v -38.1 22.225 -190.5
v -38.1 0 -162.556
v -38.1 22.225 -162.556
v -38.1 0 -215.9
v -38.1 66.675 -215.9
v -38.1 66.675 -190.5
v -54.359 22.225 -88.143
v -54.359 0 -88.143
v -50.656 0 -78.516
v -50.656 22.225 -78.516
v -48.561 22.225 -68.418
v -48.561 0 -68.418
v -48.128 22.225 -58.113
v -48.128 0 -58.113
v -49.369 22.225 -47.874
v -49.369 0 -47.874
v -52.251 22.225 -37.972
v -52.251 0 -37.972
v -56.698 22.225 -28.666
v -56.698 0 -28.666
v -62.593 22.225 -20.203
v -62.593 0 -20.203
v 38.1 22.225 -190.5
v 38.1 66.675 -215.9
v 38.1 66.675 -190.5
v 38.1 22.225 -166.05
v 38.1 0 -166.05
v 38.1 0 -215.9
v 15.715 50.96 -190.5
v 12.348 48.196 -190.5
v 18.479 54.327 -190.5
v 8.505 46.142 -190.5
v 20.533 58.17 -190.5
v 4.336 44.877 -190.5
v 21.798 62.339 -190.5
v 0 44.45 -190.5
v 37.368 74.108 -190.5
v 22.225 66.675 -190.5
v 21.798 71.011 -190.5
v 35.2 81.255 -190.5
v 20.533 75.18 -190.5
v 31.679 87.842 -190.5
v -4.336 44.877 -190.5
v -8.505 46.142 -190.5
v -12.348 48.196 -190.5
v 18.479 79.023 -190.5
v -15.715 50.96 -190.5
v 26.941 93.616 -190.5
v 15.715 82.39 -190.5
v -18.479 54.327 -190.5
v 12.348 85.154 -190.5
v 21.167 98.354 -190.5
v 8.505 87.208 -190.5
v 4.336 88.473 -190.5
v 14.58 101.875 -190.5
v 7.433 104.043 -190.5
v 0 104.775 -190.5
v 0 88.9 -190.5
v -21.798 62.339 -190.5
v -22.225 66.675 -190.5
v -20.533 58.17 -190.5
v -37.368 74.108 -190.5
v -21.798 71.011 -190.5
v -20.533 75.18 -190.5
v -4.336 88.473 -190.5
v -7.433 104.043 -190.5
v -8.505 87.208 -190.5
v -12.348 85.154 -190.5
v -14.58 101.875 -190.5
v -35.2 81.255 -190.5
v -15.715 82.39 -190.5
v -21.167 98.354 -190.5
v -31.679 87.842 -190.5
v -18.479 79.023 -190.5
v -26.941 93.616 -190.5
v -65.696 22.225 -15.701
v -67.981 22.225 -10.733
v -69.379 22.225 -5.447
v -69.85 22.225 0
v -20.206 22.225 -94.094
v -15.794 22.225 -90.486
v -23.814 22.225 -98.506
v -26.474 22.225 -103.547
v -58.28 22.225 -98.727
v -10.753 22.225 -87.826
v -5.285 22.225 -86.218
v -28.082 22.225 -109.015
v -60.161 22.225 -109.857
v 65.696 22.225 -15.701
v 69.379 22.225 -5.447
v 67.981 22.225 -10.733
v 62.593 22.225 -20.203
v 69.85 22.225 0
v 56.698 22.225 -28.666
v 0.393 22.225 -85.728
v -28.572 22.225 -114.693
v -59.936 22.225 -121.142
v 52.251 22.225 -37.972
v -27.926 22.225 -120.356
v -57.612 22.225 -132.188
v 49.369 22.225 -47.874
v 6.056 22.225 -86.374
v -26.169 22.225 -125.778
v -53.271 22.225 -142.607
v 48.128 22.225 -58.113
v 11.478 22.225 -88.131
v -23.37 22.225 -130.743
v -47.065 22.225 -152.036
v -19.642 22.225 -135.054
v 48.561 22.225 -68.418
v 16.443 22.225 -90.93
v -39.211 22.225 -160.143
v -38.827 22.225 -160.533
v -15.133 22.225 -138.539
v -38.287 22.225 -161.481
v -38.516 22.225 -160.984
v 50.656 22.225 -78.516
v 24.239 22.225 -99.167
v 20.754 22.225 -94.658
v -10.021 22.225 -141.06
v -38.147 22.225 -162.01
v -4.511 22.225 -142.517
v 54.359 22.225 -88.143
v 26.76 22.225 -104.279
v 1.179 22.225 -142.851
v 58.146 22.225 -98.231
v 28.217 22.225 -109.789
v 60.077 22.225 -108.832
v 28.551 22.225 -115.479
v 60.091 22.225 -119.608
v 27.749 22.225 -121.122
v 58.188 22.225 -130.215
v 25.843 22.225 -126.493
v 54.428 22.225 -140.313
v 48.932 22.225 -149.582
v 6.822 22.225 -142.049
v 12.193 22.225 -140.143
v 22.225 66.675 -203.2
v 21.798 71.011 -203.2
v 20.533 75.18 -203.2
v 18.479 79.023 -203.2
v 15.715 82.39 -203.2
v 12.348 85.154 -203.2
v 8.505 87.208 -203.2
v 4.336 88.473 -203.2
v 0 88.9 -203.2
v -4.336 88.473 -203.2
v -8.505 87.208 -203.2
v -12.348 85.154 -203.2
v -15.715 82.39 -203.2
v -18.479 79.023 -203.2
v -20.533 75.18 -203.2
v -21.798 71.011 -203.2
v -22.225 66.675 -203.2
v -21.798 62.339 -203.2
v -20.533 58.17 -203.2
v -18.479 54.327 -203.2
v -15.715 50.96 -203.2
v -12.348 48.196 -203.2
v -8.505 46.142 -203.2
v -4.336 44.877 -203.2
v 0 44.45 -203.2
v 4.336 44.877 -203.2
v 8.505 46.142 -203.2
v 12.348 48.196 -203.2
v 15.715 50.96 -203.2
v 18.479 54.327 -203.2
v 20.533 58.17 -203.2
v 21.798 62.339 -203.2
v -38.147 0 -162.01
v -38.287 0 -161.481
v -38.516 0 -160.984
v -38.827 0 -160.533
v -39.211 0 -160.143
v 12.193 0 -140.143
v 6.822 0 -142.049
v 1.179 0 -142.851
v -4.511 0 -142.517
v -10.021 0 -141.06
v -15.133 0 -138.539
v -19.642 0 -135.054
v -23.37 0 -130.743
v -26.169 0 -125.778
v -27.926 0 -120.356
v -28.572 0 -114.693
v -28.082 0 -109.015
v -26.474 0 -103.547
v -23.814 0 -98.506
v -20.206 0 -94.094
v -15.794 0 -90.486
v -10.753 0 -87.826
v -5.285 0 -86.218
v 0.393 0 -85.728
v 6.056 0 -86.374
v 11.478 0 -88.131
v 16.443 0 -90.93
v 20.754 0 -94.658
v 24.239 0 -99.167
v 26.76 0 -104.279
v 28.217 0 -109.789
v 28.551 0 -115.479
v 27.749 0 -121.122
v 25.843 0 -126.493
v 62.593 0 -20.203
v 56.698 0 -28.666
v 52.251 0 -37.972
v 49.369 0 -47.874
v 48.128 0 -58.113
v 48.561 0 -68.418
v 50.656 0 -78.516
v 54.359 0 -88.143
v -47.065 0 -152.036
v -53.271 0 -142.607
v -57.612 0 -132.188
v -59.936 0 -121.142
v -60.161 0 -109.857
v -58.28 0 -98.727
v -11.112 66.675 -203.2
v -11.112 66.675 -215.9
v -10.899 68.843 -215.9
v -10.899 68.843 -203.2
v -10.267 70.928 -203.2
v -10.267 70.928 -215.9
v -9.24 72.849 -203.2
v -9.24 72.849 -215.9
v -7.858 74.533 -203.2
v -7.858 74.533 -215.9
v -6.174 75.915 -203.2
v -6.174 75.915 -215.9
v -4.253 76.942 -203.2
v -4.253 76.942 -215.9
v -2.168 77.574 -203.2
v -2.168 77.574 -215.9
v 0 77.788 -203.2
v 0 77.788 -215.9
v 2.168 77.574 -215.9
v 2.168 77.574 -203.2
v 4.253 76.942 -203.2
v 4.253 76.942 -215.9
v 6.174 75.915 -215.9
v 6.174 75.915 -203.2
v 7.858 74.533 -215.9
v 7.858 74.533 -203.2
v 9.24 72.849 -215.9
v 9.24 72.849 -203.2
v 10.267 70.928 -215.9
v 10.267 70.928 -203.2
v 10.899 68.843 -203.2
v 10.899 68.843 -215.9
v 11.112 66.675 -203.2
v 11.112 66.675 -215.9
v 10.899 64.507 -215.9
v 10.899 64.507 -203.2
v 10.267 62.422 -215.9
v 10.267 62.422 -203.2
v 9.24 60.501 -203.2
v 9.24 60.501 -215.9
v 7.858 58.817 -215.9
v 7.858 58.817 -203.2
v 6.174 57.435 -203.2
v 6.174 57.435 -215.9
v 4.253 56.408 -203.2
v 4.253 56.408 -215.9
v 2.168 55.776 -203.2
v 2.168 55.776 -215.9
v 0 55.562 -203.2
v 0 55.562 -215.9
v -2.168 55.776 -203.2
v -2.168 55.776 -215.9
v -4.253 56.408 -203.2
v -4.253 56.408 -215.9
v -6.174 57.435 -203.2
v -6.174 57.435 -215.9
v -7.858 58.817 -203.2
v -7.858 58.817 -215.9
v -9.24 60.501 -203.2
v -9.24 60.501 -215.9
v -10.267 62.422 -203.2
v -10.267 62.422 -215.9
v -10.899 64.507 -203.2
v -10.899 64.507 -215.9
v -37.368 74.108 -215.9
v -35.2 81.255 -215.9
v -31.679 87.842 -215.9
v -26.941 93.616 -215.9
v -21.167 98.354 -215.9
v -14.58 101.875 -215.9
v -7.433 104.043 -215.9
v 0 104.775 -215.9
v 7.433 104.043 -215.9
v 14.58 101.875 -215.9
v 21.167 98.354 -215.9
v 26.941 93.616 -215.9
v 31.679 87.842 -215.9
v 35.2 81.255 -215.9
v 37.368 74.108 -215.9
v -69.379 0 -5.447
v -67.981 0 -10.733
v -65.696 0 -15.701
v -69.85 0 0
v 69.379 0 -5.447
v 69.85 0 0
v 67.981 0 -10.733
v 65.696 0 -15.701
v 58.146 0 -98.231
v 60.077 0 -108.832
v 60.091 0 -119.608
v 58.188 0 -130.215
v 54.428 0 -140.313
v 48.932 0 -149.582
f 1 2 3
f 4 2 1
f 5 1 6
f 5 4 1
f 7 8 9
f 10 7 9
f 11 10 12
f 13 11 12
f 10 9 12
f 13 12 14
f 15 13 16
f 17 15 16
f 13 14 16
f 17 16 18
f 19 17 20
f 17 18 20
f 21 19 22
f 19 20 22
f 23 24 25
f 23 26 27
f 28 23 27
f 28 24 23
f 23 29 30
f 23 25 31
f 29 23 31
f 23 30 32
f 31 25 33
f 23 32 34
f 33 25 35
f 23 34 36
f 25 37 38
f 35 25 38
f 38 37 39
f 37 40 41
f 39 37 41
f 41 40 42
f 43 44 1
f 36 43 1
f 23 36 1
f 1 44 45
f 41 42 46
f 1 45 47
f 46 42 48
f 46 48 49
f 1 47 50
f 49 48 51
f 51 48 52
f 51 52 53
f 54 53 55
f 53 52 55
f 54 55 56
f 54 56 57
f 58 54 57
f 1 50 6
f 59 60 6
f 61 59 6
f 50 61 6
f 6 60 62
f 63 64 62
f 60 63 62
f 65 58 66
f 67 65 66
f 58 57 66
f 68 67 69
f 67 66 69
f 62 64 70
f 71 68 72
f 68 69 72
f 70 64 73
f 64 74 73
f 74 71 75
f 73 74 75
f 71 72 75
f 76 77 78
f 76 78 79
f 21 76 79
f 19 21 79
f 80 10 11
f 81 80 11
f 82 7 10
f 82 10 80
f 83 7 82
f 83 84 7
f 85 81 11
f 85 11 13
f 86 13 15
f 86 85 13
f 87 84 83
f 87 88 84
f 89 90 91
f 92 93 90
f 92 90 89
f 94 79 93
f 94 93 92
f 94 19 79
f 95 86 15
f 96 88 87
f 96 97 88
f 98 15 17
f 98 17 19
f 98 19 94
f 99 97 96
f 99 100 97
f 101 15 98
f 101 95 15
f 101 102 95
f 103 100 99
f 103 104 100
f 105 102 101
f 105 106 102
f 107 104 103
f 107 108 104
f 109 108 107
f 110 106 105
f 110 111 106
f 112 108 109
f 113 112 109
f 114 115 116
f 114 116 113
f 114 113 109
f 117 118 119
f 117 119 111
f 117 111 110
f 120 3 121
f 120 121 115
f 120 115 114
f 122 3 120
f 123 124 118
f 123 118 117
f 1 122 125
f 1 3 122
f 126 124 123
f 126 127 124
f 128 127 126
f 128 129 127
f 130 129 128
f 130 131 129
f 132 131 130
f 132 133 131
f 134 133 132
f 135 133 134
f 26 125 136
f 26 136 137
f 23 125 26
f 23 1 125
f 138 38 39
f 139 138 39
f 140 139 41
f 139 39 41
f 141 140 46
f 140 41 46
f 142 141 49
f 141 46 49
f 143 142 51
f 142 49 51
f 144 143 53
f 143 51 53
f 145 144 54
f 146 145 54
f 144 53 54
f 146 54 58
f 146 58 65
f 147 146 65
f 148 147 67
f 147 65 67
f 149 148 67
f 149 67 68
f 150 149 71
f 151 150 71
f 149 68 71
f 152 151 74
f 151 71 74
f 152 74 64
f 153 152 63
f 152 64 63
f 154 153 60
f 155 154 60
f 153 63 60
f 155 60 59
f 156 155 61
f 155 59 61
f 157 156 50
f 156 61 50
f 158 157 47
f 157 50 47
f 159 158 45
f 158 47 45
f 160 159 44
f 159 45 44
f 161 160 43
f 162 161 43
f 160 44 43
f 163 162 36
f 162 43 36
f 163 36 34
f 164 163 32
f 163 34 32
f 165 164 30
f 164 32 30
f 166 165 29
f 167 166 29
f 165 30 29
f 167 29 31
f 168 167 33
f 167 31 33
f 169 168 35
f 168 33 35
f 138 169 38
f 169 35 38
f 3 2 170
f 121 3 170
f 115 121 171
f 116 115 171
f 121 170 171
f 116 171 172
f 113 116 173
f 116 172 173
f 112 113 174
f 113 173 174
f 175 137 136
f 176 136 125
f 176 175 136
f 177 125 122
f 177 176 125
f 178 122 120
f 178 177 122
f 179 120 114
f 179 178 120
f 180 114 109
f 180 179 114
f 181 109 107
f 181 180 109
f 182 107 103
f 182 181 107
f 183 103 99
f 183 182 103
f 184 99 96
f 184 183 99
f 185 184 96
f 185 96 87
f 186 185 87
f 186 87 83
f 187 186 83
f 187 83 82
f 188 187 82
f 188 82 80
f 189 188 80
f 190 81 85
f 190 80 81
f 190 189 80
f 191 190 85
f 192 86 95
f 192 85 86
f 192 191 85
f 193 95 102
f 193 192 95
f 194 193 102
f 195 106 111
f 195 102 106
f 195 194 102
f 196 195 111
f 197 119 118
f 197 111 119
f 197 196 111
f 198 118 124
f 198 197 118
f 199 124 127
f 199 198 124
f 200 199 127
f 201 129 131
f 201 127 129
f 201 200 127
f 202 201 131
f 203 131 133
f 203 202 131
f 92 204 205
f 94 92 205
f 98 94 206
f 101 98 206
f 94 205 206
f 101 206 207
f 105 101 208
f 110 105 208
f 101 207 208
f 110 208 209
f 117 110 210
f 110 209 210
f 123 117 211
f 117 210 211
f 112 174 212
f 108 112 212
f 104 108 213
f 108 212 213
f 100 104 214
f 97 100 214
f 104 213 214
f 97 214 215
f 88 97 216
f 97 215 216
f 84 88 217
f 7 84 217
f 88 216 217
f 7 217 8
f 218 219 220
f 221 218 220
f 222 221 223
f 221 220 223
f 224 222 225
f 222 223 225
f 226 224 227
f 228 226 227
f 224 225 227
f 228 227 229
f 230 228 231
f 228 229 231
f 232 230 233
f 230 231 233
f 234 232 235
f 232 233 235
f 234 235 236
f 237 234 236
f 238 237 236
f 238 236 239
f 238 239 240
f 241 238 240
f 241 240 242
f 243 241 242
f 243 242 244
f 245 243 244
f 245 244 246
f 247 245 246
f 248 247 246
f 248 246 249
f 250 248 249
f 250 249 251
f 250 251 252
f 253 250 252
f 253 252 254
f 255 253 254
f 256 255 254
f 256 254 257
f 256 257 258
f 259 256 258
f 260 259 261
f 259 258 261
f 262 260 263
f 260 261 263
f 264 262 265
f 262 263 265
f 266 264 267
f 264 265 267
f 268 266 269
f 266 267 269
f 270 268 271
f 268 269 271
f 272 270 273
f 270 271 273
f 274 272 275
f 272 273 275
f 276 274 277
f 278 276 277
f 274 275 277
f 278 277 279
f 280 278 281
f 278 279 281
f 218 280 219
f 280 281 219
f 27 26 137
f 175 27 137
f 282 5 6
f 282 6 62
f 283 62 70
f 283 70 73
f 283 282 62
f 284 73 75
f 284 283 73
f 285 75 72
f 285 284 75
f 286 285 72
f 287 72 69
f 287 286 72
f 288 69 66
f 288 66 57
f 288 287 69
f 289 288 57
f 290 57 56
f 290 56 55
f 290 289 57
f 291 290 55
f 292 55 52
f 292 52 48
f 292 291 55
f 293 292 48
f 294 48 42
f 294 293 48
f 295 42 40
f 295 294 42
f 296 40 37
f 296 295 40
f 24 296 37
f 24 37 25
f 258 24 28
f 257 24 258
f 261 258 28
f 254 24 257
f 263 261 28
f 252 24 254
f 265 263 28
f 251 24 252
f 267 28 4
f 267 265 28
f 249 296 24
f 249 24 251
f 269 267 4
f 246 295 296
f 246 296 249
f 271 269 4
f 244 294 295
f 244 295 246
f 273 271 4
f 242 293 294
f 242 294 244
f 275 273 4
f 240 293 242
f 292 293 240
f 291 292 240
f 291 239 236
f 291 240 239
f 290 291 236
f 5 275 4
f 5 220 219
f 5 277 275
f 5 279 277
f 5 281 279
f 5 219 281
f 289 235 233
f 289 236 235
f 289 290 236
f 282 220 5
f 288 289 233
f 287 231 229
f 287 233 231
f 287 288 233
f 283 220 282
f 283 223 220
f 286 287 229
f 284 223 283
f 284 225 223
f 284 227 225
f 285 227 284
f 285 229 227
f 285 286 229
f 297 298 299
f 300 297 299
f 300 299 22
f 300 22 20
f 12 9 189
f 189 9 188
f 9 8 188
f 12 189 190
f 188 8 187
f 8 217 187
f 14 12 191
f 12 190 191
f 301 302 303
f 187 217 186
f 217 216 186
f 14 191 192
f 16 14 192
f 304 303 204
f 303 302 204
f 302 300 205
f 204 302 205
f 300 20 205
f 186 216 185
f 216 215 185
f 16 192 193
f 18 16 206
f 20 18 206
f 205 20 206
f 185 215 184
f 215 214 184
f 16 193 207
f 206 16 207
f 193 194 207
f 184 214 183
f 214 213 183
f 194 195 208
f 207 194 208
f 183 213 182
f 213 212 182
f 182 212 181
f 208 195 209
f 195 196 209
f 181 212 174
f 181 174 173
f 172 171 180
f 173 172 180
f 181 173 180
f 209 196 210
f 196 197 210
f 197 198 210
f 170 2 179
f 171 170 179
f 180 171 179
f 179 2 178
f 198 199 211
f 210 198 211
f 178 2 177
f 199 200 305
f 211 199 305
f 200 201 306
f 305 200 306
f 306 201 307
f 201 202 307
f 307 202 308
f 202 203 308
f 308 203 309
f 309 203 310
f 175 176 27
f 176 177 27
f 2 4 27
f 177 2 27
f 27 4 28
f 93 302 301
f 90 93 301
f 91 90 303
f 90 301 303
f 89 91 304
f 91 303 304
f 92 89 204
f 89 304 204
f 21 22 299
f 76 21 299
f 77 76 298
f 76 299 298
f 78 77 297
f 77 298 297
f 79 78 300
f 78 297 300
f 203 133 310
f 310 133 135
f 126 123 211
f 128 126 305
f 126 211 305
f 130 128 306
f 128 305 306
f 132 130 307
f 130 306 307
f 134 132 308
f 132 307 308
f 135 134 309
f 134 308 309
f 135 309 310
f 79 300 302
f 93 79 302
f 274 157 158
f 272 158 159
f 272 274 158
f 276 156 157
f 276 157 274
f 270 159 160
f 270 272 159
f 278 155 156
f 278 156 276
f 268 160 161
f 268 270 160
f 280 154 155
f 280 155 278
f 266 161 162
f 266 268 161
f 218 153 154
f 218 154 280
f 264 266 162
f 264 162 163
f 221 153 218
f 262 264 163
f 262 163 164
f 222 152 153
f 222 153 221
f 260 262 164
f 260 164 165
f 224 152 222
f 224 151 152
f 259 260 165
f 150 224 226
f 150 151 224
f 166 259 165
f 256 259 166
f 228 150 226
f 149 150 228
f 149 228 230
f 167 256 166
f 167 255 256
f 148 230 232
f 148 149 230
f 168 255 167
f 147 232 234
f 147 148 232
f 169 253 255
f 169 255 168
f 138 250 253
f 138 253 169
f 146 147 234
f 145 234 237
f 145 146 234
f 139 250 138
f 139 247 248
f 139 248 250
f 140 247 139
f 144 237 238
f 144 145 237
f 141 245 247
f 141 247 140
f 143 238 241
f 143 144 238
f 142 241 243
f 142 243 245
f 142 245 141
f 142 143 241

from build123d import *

# Parameters (mm, degrees)
SKETCH1_R           = 28.575
BOSS_EXTRUDE1_DEPTH = 22.225
SKETCH3_R           = 11.1125
BOSS_EXTRUDE2_DEPTH = 25.4
SKETCH4_R           = 22.225
CUT_EXTRUDE1_DEPTH  = 12.7
CUT_EXTRUDE2_DEPTH  = 23.225


with BuildPart() as part:
    # Sketch1 → Boss-Extrude1 (new body)
    with BuildSketch(Plane(origin=(0, 0, 0), x_dir=(1, 0, 0), z_dir=(0, 1, 0))):
        with BuildLine():
            Line((-69.85, 0), (69.85, 0))
            ThreePointArc((69.85, 0), (67.980720293, 10.733361765), (62.592988676, 20.202871225))
            ThreePointArc((62.592988676, 20.202871225), (48.540246687, 52.968596396), (54.358983449, 88.142657944))
            ThreePointArc((54.358983449, 88.142657944), (59.032707712, 126.719542875), (39.21125, 160.143031078))
            ThreePointArc((39.21125, 160.143031078), (38.391163038, 161.227624395), (38.1, 162.555822188))
            Line((38.1, 162.555822188), (38.1, 215.9))
            Line((38.1, 215.9), (-38.1, 215.9))
            Line((-38.1, 215.9), (-38.1, 162.555822188))
            ThreePointArc((-38.1, 162.555822188), (-38.391163038, 161.227624395), (-39.21125, 160.143031078))
            ThreePointArc((-39.21125, 160.143031078), (-59.032707712, 126.719542875), (-54.358983449, 88.142657944))
            ThreePointArc((-54.358983449, 88.142657944), (-48.540246687, 52.968596396), (-62.592988676, 20.202871225))
            ThreePointArc((-62.592988676, 20.202871225), (-67.980720293, 10.733361765), (-69.85, 0))
        make_face()
        with Locations((0, 114.3)):
            Circle(SKETCH1_R, mode=Mode.SUBTRACT)
    extrude(amount=BOSS_EXTRUDE1_DEPTH)

    # Sketch3 → Boss-Extrude2 (add)
    with BuildSketch(Plane(origin=(0, 0, -215.9), x_dir=(-1, 0, 0), z_dir=(0, 0, -1))):
        with BuildLine():
            Line((-38.1, 22.225), (38.1, 22.225))
            Line((38.1, 22.225), (38.1, 66.675))
            ThreePointArc((38.1, 66.675), (0, 104.775), (-38.1, 66.675))
            Line((-38.1, 66.675), (-38.1, 22.225))
        make_face()
        with Locations((0, 66.675)):
            Circle(SKETCH3_R, mode=Mode.SUBTRACT)
    extrude(amount=-BOSS_EXTRUDE2_DEPTH)

    # Sketch4 → Cut-Extrude1 (cut)
    with BuildSketch(Plane.XY.offset(-190.5)):
        with Locations((0, 66.675)):
            Circle(SKETCH4_R)
    extrude(amount=-CUT_EXTRUDE1_DEPTH, mode=Mode.SUBTRACT)

    # Sketch5 → Cut-Extrude2 (cut, through all)
    with BuildSketch(Plane(origin=(0, 22.225, 0), x_dir=(1, 0, 0), z_dir=(0, 1, 0))):
        with BuildLine():
            ThreePointArc((39.21125, 160.143031078), (40.964734437, 158.583136265), (42.656216575, 156.956216575))
            Line((42.656216575, 156.956216575), (51.593275336, 165.893275336))
            Line((51.593275336, 165.893275336), (44.768280684, 172.718269988))
            Line((44.768280684, 172.718269988), (38.1, 166.049989304))
            Line((38.1, 166.049989304), (38.1, 162.555822188))
            ThreePointArc((38.1, 162.555822188), (38.391163038, 161.227624395), (39.21125, 160.143031078))
        make_face()
        with BuildLine():
            ThreePointArc((12.193016824, 140.143006128), (16.442699368, 137.670243099), (20.205576272, 134.505576272))
            Line((20.205576272, 134.505576272), (42.656216575, 156.956216575))
            ThreePointArc((42.656216575, 156.956216575), (40.964734437, 158.583136265), (39.21125, 160.143031078))
            ThreePointArc((39.21125, 160.143031078), (38.391163038, 161.227624395), (38.1, 162.555822188))
            Line((38.1, 162.555822188), (38.1, 166.049989304))
            Line((38.1, 166.049989304), (12.193016824, 140.143006128))
        make_face()
        with BuildLine():
            Line((51.593275336, 165.893275336), (42.656216575, 156.956216575))
            ThreePointArc((42.656216575, 156.956216575), (45.942151261, 153.395068263), (48.931671801, 149.581682497))
            Line((48.931671801, 149.581682497), (58.418269988, 159.068280684))
            Line((58.418269988, 159.068280684), (51.593275336, 165.893275336))
        make_face()
        with BuildLine():
            Line((42.656216575, 156.956216575), (20.205576272, 134.505576272))
            ThreePointArc((20.205576272, 134.505576272), (23.370243099, 130.742699368), (25.843006128, 126.493016824))
            Line((25.843006128, 126.493016824), (48.931671801, 149.581682497))
            ThreePointArc((48.931671801, 149.581682497), (45.942151261, 153.395068263), (42.656216575, 156.956216575))
        make_face()
    extrude(amount=-CUT_EXTRUDE2_DEPTH, mode=Mode.SUBTRACT)


solid = part.part
